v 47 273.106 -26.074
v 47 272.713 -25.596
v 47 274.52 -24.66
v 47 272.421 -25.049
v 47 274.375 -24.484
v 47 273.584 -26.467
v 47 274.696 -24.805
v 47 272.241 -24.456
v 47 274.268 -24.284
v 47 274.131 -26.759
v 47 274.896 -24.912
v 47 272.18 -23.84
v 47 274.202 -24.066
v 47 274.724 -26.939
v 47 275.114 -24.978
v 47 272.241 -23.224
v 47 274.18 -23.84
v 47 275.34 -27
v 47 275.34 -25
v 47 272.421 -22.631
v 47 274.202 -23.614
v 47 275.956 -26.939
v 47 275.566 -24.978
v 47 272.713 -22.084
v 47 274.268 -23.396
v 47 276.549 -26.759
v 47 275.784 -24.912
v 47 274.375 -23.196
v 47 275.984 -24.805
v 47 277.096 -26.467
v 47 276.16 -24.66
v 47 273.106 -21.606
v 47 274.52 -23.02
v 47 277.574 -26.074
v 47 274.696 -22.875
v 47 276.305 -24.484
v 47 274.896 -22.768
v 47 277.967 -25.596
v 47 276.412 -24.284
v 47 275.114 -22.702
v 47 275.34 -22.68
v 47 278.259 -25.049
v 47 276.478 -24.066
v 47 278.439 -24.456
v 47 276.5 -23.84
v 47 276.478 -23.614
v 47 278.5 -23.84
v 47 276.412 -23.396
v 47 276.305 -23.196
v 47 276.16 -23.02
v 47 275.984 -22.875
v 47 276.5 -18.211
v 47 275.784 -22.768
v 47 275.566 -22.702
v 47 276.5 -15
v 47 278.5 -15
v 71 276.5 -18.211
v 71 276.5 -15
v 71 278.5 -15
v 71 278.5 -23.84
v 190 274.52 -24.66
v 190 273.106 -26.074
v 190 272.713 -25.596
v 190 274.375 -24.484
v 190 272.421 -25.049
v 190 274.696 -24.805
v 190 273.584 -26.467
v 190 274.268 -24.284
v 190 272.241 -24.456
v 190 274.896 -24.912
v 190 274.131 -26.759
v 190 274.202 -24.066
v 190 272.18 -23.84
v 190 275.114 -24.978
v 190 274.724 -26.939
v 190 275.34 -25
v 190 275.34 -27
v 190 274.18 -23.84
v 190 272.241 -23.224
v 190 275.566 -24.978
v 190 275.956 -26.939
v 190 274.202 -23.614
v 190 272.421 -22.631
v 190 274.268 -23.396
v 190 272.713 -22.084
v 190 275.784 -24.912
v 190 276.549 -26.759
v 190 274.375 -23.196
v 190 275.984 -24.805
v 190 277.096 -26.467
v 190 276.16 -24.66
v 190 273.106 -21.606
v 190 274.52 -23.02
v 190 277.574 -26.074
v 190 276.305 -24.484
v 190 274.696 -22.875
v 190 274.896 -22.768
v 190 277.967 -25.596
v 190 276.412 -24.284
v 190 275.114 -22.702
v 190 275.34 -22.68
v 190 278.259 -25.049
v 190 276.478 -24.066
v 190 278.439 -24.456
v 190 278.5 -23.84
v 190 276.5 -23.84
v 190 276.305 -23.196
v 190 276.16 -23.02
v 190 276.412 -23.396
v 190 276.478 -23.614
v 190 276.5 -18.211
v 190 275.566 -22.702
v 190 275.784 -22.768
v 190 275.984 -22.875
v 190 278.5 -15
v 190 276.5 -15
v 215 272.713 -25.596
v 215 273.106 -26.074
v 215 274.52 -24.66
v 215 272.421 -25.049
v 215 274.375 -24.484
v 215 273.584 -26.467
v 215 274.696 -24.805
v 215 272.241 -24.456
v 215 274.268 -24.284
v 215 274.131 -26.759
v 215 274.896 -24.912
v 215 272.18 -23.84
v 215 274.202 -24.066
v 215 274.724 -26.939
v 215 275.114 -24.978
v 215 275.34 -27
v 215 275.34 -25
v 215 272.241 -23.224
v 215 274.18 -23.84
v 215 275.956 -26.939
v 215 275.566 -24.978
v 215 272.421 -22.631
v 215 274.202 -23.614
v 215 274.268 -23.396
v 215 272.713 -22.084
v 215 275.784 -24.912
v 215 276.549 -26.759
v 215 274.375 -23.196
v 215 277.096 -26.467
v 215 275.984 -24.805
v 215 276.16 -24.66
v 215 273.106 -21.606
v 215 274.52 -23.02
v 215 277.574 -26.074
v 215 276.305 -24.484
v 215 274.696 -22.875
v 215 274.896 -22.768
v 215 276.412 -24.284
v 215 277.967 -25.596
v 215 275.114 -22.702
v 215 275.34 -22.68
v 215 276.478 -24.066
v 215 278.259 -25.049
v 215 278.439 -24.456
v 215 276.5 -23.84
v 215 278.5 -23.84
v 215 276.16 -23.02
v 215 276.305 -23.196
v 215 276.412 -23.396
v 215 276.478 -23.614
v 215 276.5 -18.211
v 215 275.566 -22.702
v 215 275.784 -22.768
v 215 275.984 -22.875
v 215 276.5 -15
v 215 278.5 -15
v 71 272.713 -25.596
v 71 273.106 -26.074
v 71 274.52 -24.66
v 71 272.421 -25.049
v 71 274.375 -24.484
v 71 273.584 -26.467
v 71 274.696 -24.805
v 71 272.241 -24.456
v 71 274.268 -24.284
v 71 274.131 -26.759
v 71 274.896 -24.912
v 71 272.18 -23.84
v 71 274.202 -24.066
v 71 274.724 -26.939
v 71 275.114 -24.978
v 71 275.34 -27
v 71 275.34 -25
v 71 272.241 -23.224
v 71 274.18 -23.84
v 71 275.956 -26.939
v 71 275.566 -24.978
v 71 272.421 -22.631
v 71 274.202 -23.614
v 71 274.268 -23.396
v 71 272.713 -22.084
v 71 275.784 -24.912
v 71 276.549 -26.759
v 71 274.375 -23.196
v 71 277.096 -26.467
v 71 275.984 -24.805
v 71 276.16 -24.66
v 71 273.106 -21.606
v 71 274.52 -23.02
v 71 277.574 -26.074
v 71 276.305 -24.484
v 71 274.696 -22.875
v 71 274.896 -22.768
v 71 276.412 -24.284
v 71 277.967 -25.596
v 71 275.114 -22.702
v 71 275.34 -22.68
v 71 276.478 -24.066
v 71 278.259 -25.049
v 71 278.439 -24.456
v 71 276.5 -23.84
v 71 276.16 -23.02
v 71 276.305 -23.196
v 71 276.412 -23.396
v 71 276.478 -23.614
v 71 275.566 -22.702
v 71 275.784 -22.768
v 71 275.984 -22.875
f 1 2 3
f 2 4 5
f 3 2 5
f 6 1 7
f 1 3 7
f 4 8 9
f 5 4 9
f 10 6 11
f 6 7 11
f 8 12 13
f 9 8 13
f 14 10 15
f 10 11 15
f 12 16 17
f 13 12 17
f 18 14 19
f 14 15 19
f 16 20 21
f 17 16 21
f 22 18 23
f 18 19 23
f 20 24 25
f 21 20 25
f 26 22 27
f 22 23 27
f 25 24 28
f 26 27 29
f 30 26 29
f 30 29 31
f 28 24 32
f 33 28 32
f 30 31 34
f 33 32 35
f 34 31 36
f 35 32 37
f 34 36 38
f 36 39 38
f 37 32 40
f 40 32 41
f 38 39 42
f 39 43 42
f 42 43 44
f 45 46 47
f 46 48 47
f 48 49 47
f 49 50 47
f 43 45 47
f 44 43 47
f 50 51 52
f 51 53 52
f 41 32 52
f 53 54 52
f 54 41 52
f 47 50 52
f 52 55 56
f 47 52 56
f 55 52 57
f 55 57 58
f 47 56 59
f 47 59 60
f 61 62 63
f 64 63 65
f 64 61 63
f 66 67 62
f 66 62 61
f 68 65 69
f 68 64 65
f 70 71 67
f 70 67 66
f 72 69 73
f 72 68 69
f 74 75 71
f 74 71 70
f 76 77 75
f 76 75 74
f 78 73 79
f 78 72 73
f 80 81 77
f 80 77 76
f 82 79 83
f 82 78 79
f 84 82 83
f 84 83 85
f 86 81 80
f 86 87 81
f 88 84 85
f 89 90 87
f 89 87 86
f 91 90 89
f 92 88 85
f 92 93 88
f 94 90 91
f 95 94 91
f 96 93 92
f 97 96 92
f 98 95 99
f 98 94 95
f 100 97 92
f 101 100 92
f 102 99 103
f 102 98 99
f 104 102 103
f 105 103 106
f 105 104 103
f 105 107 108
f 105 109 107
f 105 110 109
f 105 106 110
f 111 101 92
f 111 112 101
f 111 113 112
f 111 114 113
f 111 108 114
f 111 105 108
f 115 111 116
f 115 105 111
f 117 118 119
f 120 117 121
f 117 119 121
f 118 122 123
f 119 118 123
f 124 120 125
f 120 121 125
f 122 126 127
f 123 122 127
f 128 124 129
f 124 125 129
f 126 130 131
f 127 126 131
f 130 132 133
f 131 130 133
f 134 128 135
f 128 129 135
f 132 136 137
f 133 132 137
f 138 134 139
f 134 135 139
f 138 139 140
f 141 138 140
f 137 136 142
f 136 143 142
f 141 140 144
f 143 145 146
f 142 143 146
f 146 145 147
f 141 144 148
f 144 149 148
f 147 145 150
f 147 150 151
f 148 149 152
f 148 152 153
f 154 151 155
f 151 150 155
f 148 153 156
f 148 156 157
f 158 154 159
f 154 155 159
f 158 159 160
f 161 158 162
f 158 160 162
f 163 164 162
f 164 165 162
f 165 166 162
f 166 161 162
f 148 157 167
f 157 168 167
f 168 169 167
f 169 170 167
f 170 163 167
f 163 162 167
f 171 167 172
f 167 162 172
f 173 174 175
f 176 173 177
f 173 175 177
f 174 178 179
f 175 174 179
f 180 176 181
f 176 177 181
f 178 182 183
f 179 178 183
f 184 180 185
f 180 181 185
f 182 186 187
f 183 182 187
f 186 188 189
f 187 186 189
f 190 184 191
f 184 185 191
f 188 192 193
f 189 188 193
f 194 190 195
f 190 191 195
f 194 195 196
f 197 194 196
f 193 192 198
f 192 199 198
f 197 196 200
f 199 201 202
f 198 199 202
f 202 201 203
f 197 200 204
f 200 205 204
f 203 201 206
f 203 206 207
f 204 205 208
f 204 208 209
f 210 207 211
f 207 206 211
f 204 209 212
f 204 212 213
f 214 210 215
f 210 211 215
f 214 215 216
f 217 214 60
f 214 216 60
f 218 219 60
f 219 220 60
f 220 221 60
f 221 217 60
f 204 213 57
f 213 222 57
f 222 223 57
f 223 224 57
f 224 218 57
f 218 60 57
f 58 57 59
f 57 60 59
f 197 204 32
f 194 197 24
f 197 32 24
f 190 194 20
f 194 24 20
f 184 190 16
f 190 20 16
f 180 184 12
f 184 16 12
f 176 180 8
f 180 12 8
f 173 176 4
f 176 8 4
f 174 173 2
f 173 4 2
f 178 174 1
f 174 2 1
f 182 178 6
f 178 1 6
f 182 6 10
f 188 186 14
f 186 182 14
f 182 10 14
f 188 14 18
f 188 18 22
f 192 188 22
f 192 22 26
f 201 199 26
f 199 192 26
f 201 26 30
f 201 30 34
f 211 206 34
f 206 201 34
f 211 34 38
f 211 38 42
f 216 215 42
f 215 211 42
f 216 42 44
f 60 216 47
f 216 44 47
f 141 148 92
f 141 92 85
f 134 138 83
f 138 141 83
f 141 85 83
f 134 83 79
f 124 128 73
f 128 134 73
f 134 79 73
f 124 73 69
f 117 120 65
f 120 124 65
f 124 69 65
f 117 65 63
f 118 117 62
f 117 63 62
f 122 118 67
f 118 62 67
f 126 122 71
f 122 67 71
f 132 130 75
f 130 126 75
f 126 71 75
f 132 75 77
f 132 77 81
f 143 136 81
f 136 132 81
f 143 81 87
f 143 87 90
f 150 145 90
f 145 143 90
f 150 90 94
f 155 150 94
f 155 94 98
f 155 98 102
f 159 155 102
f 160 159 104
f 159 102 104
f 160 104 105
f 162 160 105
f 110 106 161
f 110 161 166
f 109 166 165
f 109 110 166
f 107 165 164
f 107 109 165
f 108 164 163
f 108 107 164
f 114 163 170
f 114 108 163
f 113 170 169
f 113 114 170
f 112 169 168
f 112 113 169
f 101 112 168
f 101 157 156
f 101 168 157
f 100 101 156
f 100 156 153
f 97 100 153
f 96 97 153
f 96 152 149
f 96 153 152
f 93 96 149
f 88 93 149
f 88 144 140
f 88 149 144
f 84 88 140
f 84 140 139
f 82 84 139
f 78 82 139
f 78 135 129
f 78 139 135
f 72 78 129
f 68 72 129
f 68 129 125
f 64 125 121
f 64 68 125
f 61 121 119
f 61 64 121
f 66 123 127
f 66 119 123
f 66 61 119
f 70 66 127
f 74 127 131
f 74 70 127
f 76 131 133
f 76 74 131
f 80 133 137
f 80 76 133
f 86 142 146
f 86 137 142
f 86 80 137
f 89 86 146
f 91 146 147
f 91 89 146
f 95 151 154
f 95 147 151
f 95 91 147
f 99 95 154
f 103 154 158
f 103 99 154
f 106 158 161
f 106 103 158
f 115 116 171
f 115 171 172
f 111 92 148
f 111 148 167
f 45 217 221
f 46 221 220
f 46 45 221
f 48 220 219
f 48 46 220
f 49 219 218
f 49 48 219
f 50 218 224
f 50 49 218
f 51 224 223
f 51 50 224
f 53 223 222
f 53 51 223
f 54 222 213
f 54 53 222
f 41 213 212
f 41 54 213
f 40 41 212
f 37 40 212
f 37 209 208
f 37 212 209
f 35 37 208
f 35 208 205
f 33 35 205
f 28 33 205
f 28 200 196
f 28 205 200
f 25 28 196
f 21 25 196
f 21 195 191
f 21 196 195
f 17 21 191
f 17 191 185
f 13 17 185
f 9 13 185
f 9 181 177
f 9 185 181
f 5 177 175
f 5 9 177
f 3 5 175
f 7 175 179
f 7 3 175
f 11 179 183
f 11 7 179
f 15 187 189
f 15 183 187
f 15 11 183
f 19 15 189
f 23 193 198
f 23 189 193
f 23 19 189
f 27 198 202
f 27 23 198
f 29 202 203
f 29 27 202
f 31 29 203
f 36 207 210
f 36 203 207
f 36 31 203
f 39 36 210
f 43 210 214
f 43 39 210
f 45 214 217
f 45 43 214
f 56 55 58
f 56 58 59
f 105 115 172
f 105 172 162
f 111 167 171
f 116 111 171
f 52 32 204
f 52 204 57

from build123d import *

# Parameters (mm, degrees)
SKETCH077_W      = 25
SKETCH077_H      = 15
EXTRUDE069_DEPTH = 10
SKETCH076_R      = 1.16
EXTRUDE068_DEPTH = 175


with BuildPart() as extrude069:
    # Sketch077 → Extrude069 (new body)
    with BuildSketch(Plane(origin=(0, 280, 0), x_dir=(-1, 0, 0), z_dir=(0, 1, 0))):
        with Locations((-58.5, -20.5)):
            Rectangle(SKETCH077_W, SKETCH077_H)
        with Locations((-202.5, -20.5)):
            Rectangle(SKETCH077_W, SKETCH077_H)
    extrude(amount=-EXTRUDE069_DEPTH)


with BuildPart() as battery_hinge001:
    # Sketch076 → Extrude068 (new body)
    with BuildSketch(Plane.YZ.offset(47)):
        with BuildLine():
            ThreePointArc((273.105543, -21.605543), (274.13072, -26.759459), (278.5, -23.84))
            Line((278.5, -15), (278.5, -23.84))
            Line((276.5, -15), (278.5, -15))
            Line((276.5, -18.211085), (276.5, -15))
            Line((273.105543, -21.605543), (276.5, -18.211085))
        make_face()
        with Locations((275.34, -23.84)):
            Circle(SKETCH076_R, mode=Mode.SUBTRACT)
    extrude(amount=EXTRUDE068_DEPTH)

    # Common: intersect Extrude069
    add(extrude069.part, mode=Mode.INTERSECT)


solid = battery_hinge001.part
